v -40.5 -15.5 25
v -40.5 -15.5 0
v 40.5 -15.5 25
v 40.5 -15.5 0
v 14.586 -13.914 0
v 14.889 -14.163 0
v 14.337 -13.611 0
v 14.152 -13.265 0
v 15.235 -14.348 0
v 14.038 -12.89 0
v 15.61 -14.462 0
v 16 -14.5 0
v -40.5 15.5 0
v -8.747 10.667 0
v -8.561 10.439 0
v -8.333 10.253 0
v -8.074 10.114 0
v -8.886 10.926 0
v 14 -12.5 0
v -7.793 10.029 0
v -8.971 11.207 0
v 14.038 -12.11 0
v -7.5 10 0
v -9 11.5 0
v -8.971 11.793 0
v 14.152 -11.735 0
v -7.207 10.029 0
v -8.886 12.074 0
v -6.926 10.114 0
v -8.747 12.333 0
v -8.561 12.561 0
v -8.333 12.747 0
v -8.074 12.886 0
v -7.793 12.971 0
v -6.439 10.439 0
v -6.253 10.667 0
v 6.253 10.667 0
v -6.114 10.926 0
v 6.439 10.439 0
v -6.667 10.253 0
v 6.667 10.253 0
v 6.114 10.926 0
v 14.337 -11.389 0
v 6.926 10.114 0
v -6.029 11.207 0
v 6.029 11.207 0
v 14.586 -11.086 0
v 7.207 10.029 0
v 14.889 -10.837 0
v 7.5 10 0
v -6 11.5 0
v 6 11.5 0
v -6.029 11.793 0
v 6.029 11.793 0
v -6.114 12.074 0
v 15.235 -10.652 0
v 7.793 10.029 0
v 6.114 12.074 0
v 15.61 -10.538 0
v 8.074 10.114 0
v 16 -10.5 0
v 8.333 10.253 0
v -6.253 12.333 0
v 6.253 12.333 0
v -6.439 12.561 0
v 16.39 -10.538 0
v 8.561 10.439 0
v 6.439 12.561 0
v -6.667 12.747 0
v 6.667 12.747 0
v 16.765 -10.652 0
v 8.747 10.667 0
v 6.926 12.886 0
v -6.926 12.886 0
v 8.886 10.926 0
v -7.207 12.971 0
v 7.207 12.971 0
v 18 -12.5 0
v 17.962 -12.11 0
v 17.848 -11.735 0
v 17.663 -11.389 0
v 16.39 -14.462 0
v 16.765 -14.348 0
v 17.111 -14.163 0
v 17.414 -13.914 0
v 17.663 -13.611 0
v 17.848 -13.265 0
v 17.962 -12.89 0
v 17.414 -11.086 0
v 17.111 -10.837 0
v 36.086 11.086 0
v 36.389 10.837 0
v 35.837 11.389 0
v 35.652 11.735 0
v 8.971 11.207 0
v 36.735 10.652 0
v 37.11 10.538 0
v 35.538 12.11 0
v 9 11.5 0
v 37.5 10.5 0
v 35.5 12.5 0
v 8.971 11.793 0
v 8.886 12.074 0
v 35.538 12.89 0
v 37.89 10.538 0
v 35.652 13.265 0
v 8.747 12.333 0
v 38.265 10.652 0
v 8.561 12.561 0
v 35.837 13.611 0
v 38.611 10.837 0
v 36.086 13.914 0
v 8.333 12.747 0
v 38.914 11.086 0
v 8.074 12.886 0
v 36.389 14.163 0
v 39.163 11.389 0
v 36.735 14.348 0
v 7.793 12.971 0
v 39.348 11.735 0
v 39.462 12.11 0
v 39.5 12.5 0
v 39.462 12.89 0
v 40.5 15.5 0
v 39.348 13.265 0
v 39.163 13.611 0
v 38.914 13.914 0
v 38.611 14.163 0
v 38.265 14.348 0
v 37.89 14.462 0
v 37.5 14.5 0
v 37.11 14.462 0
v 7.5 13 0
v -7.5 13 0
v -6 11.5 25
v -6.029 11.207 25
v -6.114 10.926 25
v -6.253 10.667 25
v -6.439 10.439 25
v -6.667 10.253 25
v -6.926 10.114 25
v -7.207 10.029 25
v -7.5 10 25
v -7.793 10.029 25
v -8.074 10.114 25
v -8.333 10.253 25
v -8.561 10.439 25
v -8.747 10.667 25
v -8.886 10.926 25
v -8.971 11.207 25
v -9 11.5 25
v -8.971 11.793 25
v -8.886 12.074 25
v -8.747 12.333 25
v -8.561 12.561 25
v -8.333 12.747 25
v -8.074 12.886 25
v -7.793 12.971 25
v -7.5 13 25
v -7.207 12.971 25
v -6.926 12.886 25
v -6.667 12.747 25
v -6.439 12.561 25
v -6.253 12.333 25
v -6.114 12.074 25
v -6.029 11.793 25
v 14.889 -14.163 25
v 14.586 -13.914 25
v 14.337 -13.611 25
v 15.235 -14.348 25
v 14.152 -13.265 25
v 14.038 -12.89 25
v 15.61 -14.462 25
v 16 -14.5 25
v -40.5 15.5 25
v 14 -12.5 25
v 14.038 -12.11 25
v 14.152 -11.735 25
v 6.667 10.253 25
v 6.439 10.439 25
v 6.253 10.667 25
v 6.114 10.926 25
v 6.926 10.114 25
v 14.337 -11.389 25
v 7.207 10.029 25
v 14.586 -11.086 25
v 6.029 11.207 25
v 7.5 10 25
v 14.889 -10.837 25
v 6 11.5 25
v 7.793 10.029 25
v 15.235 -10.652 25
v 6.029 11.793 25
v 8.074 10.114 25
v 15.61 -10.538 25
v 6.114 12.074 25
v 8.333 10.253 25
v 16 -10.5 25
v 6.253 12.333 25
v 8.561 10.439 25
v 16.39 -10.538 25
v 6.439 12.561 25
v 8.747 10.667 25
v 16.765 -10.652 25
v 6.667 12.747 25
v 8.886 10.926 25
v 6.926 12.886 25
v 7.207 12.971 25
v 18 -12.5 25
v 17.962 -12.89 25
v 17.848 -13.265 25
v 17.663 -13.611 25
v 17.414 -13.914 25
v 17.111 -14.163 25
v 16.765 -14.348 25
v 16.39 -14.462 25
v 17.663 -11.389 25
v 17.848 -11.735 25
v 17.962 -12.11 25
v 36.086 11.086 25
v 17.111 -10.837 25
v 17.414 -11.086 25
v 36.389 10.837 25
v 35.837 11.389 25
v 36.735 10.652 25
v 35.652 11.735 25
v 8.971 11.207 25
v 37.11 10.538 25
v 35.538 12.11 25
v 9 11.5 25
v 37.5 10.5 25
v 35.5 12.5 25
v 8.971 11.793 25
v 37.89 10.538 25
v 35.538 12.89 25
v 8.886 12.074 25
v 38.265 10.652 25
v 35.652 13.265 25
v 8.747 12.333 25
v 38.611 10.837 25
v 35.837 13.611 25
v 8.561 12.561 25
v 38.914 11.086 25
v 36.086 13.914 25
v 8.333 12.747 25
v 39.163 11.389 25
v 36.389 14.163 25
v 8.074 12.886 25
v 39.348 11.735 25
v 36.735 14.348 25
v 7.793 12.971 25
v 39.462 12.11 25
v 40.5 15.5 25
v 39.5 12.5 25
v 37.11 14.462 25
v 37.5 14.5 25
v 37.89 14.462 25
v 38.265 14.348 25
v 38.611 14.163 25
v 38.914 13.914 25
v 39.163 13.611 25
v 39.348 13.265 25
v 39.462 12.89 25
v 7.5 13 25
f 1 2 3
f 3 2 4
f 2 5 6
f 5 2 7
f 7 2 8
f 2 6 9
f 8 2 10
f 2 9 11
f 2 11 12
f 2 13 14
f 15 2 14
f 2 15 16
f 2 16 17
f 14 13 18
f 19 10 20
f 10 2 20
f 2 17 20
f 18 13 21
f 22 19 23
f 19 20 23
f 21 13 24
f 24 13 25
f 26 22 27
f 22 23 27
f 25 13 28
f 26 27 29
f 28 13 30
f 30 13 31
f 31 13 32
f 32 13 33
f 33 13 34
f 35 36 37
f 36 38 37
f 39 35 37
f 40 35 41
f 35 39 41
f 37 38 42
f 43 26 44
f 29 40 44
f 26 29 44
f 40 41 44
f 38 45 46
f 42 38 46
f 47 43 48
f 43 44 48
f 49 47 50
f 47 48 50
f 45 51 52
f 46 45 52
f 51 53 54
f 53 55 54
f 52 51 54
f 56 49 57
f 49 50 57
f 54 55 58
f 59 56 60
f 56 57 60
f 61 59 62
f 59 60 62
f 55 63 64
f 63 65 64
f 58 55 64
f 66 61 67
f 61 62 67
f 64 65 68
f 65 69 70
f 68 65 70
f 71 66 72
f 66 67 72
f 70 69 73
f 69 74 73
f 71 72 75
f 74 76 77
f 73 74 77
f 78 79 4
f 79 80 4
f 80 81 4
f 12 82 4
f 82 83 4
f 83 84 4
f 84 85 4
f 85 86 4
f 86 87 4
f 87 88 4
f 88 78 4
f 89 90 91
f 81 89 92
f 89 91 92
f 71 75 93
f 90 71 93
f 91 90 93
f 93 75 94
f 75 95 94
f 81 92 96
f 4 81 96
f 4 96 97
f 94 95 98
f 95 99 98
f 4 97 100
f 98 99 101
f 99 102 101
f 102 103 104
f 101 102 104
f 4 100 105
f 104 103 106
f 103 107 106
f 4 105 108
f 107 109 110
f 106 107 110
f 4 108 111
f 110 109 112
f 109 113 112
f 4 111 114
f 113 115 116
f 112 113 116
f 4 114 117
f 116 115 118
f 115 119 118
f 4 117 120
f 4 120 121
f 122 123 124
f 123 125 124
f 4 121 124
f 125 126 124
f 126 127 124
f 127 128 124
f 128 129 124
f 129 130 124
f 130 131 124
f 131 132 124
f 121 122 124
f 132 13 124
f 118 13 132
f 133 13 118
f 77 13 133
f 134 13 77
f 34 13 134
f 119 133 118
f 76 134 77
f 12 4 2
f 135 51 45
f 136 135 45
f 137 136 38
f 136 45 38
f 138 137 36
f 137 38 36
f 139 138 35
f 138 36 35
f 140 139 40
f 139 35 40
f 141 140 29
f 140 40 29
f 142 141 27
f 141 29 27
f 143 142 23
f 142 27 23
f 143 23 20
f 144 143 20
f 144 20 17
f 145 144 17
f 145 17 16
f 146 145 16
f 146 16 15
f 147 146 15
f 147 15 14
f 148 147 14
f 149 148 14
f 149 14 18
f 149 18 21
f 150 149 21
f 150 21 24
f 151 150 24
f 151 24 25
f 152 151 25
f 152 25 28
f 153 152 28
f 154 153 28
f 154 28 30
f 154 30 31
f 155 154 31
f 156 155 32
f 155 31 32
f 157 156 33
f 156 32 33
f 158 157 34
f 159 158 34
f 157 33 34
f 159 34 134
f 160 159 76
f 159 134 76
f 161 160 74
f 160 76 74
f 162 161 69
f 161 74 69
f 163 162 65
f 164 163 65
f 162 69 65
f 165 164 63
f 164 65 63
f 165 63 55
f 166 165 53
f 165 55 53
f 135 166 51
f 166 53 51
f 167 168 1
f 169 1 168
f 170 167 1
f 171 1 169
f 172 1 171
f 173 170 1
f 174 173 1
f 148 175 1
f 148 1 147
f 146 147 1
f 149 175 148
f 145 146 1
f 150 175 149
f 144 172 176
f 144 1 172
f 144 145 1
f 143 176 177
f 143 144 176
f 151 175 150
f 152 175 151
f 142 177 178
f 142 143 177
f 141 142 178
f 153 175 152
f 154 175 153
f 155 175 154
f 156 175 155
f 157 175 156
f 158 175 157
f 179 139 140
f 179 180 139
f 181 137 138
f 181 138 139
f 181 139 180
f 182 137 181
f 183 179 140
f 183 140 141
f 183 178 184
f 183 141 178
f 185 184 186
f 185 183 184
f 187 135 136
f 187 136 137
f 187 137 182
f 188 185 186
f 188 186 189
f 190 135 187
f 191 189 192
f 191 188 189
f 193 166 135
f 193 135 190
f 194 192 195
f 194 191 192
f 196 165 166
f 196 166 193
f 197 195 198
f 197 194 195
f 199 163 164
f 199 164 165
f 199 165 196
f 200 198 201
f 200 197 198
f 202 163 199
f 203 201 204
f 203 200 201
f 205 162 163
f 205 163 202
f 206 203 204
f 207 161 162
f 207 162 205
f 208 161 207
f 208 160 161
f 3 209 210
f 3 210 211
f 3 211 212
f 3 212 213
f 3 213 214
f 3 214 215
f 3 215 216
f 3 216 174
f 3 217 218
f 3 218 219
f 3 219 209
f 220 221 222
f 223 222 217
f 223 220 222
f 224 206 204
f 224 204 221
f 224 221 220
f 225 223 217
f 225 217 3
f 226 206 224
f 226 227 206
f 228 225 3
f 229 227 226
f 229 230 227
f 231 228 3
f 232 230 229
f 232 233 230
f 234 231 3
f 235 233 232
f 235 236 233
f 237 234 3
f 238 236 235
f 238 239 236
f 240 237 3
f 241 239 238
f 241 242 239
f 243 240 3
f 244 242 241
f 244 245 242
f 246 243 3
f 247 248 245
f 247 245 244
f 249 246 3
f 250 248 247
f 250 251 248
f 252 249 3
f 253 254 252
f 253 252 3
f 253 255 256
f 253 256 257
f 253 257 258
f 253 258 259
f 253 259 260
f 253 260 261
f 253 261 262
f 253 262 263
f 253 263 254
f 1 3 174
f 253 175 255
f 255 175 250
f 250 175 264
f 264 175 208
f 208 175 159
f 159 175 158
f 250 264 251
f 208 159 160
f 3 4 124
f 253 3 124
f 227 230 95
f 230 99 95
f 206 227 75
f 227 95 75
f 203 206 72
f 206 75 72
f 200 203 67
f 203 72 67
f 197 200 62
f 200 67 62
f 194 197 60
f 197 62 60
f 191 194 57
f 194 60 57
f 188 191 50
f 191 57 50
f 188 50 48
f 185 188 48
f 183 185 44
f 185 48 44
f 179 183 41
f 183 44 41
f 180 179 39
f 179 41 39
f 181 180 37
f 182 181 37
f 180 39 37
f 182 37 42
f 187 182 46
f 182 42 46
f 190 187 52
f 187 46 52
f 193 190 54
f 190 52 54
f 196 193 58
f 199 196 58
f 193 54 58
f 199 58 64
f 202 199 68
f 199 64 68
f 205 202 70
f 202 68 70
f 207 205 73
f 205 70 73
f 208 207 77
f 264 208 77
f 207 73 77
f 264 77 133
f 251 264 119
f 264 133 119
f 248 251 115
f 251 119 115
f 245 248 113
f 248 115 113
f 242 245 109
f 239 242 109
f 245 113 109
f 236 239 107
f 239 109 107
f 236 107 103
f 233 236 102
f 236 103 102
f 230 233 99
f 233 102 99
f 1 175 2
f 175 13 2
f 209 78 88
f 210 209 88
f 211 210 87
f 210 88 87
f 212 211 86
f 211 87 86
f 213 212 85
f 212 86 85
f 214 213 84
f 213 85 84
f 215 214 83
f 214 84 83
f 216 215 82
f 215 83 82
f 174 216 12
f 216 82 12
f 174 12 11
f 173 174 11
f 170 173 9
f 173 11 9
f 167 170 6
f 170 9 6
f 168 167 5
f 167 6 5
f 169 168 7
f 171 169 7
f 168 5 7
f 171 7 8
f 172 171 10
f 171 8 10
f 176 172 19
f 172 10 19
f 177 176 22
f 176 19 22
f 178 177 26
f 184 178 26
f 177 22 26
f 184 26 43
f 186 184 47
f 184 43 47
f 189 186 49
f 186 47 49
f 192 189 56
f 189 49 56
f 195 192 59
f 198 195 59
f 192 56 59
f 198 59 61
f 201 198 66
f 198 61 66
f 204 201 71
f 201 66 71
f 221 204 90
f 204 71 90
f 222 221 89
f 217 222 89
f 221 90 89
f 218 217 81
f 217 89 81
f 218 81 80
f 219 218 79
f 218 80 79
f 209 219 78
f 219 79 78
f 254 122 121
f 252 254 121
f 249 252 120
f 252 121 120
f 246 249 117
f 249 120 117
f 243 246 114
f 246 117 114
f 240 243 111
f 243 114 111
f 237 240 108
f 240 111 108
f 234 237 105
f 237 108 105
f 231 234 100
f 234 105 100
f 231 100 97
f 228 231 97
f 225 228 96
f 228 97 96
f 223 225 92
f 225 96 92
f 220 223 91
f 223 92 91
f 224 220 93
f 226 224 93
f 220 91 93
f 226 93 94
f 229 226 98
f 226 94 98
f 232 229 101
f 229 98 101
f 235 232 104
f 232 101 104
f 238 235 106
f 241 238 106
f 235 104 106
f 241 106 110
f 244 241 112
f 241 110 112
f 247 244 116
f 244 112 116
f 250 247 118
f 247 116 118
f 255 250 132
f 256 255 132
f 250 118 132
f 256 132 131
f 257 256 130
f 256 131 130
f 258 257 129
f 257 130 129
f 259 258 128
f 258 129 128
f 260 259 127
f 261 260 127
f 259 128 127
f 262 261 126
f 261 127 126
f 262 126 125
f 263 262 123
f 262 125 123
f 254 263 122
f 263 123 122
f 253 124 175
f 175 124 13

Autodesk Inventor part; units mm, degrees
ref_plane "YZ Plane" through (0, 0, 0) normal (1, 0, 0) x (0, 1, 0)
ref_plane "XZ Plane" through (0, 0, 0) normal (0, 1, 0) x (-1, 0, 0)
ref_plane "XY Plane" through (0, 0, 0) normal (0, 0, 1) x (1, 0, 0)
sketch "Sketch1" plane through (0, 0, 0) normal (0, 0, 1) x (1, 0, 0)
  line L0 (-40.5, -15.5) -> (40.5, -15.5)
  line L1 (40.5, -15.5) -> (40.5, 15.5)
  line L2 (40.5, 15.5) -> (-40.5, 15.5)
  line L3 (-40.5, 15.5) -> (-40.5, -15.5)
  line L4 (-40.5, -15.5) -> (40.5, 15.5) construction
  line L5 (40.5, -15.5) -> (-40.5, 15.5) construction
  line L6 (37.5, 15.5) -> (37.5, -15.5)
  circle A0 centre (37.5, 12.5) radius 2
  line L7 (16, -15.5) -> (16, 15.5)
  circle A1 centre (16, -12.5) radius 2
  line L8 (7.5, -15.5) -> (7.5, 15.5)
  circle A2 centre (7.5, 11.5) radius 1.5
  line L9 (-7.5, -15.5) -> (-7.5, 15.5)
  circle A3 centre (-7.5, 11.5) radius 1.5
  point P0 (0, 0)
  dimension "d0" = 3
  dimension "d1" = 81
  dimension "d2" = 31
  dimension "d3" = 4
  dimension "d4" = 3
  dimension "d5" = 24.5
  dimension "d6" = 4
  dimension "d7" = 3
  dimension "d8" = 30
  dimension "d9" = 3
  dimension "d11" = 4
  dimension "d12" = 15
  dimension "d13" = 3
extrude "Extrusion1" add sketch "Sketch1" along normal blind 25 contours L3 L2 L9 A3 L0 | L9 A3 L2 L8 A2 L0 | L8 A2 L2 L7 A1 L0 | L7 A1 L2 L6 A0 L0 | L6 A0 L2 L1 L0
properties part number "Bluepill" material "Silver"
